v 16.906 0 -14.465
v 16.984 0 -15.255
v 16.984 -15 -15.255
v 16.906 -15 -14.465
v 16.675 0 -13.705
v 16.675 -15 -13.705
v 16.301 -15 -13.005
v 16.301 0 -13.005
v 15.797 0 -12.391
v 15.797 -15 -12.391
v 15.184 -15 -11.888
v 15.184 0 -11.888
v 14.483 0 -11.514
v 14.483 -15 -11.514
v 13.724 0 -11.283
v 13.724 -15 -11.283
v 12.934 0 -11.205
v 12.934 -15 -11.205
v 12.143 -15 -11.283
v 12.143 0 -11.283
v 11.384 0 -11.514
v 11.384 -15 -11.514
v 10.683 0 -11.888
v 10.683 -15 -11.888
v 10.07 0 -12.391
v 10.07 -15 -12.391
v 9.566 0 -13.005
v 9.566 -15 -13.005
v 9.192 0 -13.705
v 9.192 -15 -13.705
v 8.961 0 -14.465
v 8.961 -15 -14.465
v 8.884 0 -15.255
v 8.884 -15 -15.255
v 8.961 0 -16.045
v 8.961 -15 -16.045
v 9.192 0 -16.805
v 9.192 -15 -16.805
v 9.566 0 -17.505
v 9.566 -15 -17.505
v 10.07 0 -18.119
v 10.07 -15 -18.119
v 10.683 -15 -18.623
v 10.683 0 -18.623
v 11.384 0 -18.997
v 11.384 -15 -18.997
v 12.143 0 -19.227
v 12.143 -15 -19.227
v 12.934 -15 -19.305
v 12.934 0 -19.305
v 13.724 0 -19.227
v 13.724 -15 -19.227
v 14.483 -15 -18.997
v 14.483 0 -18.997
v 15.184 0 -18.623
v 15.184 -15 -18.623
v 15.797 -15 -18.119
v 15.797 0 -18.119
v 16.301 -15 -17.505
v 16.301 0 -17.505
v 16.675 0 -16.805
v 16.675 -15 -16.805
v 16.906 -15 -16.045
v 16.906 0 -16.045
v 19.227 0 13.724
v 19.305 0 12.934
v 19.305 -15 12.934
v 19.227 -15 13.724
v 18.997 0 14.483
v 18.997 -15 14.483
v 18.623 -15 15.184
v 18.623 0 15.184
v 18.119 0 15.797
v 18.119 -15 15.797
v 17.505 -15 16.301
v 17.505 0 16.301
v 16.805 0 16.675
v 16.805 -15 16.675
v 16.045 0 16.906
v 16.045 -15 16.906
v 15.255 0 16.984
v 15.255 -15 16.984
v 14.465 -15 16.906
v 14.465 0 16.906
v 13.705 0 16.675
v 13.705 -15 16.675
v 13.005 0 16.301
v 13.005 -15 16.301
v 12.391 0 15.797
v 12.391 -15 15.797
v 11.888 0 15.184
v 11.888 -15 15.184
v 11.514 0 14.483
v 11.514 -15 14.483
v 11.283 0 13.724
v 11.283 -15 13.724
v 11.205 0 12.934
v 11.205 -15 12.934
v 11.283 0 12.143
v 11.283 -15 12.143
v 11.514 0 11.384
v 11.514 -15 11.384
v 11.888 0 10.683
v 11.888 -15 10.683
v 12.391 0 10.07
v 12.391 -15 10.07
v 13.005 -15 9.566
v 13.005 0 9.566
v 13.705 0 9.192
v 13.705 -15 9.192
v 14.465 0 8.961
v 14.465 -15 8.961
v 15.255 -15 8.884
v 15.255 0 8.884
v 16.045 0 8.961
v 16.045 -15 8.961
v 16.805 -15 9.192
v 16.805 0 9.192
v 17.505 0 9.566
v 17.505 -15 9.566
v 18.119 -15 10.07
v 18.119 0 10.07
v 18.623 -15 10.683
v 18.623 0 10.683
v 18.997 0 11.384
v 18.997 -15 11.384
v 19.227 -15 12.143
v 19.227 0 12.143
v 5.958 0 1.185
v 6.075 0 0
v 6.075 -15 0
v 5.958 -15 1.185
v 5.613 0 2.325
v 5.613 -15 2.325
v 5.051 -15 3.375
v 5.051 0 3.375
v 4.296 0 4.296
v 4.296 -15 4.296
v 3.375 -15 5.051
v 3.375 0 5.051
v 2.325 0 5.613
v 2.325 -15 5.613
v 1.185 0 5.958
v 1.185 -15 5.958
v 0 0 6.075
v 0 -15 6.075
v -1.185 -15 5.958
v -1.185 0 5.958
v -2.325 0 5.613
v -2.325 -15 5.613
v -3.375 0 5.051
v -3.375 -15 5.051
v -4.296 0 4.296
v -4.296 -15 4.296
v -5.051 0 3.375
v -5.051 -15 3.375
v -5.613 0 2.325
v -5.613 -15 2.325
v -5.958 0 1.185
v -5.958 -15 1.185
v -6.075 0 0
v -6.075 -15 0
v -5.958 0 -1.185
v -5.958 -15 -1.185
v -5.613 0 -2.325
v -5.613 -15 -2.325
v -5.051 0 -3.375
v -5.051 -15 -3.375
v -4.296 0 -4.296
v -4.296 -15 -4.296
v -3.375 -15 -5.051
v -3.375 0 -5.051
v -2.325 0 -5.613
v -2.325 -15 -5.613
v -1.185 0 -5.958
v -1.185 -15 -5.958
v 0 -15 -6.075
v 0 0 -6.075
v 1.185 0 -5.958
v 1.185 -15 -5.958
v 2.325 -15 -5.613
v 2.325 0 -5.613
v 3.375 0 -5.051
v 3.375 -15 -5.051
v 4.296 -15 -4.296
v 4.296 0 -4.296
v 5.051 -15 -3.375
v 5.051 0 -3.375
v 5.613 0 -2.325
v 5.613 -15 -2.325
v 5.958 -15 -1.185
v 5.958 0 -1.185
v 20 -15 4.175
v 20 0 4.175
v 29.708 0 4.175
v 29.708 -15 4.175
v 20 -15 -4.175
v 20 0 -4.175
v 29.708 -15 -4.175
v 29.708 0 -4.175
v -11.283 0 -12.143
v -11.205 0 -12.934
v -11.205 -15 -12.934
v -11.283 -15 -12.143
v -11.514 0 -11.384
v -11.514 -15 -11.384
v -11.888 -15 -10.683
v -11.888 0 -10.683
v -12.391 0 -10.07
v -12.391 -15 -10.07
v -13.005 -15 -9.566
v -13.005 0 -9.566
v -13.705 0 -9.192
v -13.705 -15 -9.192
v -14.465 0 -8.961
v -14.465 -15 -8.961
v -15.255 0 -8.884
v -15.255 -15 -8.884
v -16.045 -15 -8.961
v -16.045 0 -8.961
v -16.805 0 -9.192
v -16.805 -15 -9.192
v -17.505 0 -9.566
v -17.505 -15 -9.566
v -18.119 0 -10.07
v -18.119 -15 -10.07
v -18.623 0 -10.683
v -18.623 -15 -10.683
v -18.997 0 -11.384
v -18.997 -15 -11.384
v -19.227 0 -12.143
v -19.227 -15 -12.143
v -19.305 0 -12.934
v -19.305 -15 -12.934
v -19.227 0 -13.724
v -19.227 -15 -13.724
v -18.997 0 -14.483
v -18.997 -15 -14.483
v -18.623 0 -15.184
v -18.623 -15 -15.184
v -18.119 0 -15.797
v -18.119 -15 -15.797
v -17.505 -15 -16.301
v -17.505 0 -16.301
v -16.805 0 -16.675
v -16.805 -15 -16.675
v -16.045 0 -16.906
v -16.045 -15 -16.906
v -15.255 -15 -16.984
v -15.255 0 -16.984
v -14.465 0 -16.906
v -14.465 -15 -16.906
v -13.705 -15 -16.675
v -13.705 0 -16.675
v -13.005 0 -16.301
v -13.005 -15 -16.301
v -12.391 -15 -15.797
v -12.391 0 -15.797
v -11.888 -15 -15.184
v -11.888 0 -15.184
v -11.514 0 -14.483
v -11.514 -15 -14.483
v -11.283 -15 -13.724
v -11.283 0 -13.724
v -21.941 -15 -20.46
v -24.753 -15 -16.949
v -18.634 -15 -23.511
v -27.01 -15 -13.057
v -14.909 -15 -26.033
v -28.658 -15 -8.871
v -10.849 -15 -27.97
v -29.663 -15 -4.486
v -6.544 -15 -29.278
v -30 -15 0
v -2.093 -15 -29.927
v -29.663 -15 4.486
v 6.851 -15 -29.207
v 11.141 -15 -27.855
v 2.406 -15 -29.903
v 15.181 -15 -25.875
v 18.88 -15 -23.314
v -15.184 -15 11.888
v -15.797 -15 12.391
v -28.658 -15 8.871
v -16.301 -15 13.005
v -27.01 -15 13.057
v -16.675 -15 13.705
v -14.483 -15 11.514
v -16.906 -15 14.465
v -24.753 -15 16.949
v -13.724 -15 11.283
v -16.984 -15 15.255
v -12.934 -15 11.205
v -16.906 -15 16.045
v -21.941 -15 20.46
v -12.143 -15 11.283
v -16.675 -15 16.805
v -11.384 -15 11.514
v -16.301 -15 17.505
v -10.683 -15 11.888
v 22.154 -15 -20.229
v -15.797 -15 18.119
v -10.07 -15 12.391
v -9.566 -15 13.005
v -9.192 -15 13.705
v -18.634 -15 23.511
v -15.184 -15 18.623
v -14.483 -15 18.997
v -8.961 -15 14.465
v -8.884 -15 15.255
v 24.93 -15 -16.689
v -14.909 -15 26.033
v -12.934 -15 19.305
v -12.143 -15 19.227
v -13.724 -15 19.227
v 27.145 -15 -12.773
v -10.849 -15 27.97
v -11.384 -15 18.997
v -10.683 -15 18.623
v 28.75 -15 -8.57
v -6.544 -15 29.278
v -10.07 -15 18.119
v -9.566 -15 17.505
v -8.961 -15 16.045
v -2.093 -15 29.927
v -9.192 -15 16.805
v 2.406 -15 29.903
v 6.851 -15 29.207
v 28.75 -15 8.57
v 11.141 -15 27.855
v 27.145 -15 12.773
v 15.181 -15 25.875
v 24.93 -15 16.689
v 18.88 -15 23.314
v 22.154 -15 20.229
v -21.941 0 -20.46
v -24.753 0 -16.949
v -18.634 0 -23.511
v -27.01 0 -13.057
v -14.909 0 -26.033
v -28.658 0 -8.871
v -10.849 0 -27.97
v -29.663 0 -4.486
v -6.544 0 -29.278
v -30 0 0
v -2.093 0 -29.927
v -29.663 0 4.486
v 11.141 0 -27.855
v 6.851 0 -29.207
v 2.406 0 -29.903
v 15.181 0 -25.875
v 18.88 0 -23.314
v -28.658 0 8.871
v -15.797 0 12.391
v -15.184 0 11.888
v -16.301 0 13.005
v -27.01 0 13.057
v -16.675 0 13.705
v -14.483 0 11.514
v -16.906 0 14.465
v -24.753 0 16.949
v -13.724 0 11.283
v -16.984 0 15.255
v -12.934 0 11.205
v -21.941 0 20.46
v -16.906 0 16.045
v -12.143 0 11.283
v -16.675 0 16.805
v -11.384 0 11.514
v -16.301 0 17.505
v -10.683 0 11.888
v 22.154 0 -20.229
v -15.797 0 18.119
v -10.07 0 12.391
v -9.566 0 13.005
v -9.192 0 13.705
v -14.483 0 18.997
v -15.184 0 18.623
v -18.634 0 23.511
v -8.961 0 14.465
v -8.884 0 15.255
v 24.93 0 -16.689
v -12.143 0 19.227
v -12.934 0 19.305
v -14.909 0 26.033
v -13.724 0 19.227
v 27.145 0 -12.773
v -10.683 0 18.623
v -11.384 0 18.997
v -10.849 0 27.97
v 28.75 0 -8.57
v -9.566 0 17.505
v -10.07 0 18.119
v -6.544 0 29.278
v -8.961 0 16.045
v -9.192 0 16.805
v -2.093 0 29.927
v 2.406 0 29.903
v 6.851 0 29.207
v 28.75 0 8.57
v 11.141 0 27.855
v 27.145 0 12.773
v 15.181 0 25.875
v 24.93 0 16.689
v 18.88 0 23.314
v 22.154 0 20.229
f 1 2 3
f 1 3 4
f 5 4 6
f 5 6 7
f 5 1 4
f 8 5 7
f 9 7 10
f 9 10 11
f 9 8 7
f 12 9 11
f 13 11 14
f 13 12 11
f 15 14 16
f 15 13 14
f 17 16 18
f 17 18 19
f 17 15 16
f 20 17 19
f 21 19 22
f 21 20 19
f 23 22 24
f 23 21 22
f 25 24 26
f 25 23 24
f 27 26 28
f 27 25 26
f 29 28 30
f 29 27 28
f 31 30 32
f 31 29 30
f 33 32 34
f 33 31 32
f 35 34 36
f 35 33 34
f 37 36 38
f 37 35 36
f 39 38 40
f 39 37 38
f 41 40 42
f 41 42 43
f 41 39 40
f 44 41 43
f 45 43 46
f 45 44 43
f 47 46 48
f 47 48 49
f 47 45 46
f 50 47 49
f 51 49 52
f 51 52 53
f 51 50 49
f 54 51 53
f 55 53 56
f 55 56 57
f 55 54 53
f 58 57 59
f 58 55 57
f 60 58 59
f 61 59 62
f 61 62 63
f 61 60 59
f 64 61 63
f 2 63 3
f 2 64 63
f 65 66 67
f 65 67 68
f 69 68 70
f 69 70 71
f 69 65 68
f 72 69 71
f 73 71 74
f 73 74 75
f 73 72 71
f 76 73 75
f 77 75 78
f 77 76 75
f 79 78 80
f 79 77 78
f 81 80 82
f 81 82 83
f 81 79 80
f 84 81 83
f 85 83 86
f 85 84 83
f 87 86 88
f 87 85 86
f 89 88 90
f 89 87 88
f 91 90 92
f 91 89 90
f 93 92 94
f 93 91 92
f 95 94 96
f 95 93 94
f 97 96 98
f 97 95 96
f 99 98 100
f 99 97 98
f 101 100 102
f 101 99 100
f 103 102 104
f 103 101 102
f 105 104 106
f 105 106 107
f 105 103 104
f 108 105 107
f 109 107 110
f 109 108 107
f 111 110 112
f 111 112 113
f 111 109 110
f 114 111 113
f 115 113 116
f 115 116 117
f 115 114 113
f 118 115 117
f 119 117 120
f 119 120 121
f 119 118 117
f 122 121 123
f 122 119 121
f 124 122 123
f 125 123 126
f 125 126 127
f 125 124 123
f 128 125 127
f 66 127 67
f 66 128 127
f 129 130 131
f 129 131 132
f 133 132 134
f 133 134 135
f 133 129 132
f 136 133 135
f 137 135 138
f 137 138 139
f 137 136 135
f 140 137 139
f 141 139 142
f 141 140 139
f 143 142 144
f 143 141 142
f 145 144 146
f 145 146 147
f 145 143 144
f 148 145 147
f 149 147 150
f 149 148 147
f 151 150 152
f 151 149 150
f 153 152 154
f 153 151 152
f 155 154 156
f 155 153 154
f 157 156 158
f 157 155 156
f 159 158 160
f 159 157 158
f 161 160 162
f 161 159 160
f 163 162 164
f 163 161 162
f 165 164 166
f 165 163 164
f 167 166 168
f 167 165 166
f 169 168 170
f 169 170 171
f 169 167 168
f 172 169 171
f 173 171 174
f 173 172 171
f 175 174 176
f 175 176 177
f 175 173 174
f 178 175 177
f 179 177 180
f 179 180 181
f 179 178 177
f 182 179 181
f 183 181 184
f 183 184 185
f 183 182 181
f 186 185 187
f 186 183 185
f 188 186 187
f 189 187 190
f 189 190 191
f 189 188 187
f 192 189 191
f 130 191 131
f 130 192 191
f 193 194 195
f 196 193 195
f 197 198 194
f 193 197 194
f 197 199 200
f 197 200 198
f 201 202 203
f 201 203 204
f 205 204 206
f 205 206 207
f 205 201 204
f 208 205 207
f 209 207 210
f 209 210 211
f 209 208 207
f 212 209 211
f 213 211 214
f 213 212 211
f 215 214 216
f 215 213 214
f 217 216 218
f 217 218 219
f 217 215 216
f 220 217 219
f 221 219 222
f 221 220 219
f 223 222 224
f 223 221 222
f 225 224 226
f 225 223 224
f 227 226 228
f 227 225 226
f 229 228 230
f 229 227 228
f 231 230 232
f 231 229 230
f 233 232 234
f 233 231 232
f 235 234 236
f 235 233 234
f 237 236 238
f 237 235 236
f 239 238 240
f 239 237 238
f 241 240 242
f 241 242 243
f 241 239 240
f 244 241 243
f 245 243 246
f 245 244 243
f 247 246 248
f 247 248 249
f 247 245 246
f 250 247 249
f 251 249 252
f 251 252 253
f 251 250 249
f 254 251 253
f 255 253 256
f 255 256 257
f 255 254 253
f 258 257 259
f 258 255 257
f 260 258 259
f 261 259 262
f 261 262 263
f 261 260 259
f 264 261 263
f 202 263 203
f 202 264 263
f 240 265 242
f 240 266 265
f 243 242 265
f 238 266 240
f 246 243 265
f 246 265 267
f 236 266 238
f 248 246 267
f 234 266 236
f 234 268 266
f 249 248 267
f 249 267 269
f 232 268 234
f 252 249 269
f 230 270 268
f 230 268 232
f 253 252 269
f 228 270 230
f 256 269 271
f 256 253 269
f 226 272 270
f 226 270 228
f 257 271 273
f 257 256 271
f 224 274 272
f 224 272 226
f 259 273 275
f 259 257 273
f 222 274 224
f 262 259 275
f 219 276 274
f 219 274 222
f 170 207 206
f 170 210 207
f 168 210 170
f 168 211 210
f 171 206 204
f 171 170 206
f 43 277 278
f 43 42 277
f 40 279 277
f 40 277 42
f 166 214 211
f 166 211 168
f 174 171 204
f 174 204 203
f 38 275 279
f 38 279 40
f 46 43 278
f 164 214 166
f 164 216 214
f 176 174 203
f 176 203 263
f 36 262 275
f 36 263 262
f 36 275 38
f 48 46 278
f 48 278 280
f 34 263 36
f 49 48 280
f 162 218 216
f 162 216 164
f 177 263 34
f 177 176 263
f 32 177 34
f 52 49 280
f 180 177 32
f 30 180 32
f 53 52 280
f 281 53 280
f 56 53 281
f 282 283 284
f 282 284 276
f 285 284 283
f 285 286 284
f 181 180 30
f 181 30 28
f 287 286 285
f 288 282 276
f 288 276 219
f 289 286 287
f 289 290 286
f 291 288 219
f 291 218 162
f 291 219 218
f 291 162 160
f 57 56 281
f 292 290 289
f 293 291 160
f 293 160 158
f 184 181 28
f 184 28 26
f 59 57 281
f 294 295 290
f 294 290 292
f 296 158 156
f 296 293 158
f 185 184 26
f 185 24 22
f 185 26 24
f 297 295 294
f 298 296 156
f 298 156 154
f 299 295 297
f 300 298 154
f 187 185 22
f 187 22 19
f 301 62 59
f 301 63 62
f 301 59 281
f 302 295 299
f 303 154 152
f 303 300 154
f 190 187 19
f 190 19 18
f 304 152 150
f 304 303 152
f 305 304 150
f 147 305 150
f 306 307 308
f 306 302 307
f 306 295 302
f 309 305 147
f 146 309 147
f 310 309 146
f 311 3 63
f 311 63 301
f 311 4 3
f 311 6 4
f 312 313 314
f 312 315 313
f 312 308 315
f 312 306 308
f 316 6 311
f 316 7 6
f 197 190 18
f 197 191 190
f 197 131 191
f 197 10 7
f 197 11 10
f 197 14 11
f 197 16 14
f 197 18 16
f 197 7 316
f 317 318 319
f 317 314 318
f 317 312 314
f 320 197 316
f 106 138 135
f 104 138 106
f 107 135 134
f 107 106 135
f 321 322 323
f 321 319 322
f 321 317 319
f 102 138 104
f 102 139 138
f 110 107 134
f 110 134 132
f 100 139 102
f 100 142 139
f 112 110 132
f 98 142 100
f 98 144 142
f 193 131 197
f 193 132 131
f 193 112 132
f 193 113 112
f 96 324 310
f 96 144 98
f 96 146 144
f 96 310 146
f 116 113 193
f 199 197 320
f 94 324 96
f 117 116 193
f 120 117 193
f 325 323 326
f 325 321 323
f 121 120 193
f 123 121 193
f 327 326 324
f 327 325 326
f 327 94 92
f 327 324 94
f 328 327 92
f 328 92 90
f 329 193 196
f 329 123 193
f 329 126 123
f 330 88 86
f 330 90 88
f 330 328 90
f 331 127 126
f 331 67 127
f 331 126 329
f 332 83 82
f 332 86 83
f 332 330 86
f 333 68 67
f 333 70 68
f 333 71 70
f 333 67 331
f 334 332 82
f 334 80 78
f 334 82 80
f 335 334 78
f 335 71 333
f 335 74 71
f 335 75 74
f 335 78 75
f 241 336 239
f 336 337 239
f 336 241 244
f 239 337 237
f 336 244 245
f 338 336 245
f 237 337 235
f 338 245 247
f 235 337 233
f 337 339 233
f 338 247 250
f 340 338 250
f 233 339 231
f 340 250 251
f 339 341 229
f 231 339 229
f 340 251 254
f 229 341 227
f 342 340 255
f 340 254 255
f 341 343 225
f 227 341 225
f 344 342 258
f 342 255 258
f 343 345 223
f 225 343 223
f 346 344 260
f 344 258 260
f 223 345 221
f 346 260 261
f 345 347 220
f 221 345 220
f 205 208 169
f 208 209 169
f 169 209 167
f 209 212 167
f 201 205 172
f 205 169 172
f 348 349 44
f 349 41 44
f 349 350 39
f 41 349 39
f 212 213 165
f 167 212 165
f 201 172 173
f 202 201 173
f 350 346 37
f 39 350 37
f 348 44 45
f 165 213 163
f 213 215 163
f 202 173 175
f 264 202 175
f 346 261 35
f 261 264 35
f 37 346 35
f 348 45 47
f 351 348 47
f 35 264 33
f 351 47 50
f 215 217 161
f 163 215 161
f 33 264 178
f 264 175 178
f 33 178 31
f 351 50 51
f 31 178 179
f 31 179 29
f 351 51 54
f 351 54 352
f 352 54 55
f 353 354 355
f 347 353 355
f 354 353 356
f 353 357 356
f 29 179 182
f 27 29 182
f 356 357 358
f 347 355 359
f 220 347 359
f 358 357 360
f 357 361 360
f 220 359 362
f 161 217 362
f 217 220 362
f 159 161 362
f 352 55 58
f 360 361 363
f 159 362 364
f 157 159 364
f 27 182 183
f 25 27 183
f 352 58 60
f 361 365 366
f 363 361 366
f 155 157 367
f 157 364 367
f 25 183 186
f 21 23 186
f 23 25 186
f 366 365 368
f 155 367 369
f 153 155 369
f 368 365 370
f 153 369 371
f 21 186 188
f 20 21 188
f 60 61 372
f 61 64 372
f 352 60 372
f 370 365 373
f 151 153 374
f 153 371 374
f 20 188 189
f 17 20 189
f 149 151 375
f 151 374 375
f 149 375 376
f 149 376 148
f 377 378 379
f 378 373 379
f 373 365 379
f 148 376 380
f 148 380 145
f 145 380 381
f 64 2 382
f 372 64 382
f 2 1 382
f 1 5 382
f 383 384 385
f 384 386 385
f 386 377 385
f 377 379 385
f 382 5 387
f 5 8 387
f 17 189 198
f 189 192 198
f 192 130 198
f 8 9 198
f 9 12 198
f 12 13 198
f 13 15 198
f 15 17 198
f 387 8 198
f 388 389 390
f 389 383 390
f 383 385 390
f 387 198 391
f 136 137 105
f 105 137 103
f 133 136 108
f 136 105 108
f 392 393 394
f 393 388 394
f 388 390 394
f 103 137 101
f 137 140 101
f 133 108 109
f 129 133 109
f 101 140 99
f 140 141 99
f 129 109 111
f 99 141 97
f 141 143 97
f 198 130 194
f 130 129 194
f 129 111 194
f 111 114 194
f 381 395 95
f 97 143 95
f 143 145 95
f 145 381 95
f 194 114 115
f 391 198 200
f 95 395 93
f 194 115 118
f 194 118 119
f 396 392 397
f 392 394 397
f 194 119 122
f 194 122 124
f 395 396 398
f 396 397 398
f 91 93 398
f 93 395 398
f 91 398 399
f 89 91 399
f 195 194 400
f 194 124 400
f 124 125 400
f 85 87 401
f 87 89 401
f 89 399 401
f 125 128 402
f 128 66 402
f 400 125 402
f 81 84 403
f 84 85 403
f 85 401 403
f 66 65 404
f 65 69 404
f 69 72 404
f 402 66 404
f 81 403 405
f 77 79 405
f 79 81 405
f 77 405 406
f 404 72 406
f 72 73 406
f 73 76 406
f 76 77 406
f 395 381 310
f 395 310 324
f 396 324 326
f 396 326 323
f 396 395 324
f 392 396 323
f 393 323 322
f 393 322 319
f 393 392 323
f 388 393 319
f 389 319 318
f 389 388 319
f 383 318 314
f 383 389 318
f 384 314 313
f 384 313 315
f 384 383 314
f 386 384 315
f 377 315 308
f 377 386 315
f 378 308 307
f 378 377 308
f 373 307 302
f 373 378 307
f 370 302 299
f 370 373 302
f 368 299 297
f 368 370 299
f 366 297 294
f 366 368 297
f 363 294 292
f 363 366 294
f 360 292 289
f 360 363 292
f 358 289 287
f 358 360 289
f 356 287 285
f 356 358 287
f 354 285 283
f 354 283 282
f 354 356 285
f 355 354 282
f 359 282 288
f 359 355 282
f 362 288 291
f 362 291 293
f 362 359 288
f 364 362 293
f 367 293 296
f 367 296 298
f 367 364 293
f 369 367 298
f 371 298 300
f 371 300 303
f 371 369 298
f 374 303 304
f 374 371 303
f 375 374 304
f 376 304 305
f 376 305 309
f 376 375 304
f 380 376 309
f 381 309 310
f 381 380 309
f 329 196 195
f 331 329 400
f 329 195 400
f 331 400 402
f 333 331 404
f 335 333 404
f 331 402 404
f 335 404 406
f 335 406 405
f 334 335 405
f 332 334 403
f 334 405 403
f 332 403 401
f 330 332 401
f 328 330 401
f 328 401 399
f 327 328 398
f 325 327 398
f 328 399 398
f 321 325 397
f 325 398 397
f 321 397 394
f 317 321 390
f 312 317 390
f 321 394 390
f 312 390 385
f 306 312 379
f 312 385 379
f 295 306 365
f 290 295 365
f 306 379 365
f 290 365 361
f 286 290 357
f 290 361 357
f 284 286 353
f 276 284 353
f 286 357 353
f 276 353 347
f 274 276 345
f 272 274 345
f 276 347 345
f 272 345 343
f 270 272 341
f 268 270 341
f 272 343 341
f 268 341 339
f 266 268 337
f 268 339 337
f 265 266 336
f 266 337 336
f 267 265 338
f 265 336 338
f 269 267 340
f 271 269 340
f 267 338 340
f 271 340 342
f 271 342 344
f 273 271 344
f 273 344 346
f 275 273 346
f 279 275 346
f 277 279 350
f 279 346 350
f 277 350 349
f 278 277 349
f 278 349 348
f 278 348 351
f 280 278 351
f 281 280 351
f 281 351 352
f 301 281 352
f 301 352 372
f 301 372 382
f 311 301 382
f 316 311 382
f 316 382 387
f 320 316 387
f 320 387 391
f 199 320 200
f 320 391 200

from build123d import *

# Parameters (mm, degrees)
F0_R     = 4.05
F0_R_2   = 6.075
F1_DEPTH = 15


with BuildPart() as f1:
    # F0 (on Front) → F1 (new body)
    with BuildSketch(Plane.XZ):
        with BuildLine():
            Line((20, 4.175), (29.708069, 4.175))
            ThreePointArc((29.708069, 4.175), (-30, 0), (29.708069, -4.175))
            Line((29.708069, -4.175), (20, -4.175))
            Line((20, -4.175), (20, 4.175))
        make_face()
        with Locations((-15.255275, -12.933545)):
            Circle(F0_R, mode=Mode.SUBTRACT)
        with Locations((12.933545, -15.255275)):
            Circle(F0_R, mode=Mode.SUBTRACT)
        with Locations((-12.933545, 15.255275)):
            Circle(F0_R, mode=Mode.SUBTRACT)
        Circle(F0_R_2, mode=Mode.SUBTRACT)
        with Locations((15.255275, 12.933545)):
            Circle(F0_R, mode=Mode.SUBTRACT)
    extrude(amount=F1_DEPTH)


solid = f1.part
